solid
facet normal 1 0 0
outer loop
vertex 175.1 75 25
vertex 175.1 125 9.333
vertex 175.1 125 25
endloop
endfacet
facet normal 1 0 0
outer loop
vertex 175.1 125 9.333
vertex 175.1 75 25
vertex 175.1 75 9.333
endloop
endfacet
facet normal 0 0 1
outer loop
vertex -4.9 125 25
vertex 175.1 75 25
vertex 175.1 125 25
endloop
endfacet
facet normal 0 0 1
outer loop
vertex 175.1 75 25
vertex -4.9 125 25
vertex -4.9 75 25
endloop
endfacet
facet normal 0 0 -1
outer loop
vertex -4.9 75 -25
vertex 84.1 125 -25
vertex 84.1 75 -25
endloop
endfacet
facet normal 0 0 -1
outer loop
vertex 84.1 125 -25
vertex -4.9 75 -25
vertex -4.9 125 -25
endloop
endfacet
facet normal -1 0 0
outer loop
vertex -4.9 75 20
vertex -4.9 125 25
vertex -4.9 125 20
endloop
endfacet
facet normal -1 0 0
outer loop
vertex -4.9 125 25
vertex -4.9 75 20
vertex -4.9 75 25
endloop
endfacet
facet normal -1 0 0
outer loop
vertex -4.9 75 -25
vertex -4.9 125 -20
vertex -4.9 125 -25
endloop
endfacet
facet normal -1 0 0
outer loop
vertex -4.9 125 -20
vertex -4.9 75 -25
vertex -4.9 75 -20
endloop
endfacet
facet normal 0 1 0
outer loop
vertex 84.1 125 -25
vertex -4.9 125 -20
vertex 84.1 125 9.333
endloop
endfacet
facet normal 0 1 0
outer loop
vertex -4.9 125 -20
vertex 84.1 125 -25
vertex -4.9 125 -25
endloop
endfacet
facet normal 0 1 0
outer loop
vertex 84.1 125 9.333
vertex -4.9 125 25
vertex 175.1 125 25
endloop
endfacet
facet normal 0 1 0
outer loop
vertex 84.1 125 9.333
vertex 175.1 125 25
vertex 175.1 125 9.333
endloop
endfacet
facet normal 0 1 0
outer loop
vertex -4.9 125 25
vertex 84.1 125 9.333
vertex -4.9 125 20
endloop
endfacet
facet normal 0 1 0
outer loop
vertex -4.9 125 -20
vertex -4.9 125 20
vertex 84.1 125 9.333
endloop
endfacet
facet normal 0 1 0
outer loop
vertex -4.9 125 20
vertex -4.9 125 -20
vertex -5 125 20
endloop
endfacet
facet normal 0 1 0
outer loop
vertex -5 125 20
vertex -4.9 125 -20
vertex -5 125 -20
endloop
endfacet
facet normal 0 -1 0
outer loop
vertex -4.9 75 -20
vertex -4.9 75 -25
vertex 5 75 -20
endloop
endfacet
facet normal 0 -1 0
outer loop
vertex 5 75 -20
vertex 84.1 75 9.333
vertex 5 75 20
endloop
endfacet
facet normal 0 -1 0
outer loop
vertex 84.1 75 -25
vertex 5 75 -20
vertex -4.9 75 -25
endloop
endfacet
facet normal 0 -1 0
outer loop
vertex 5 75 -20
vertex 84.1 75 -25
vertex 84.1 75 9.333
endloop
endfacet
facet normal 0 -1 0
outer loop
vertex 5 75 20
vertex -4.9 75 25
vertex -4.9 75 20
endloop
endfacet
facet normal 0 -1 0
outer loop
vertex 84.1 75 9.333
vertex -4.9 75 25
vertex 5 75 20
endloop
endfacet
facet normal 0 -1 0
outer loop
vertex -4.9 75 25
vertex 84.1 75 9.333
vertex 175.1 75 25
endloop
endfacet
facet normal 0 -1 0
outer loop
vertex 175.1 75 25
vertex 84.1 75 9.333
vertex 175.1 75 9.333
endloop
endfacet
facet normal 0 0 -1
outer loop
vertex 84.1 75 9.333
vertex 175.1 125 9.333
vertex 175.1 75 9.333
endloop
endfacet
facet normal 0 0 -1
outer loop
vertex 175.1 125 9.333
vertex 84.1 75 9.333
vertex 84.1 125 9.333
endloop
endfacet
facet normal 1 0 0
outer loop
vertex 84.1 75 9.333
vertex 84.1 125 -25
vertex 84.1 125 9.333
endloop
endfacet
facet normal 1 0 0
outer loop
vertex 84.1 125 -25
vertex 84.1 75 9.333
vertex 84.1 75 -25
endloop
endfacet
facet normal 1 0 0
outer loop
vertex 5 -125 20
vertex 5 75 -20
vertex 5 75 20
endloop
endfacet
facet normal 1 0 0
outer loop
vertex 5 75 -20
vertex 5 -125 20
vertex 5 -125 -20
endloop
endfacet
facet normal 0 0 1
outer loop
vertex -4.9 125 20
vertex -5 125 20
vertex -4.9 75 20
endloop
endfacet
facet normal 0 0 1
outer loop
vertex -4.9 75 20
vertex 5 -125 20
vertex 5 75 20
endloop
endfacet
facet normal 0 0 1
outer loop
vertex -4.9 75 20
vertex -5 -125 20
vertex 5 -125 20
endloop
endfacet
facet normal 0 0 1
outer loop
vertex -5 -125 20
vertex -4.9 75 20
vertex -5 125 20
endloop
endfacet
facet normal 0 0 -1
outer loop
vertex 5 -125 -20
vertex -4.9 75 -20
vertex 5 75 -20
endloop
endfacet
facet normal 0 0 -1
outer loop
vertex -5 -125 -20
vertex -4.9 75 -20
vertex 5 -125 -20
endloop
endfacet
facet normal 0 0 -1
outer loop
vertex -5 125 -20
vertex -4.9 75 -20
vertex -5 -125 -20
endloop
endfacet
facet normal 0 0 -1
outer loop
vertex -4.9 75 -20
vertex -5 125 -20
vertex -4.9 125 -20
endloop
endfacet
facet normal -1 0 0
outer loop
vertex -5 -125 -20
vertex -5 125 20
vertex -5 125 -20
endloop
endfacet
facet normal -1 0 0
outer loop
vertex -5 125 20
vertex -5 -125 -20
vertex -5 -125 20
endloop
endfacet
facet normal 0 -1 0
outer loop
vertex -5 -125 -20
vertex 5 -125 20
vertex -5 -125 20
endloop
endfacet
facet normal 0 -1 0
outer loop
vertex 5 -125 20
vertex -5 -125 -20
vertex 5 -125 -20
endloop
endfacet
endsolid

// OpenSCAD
module right_arm_new(){
    arm_x = 10;
    arm_y = 250;
    arm_z = 40;
    
    cube([arm_x,arm_y,arm_z],center=true);  
   
    x_base = 180;
    y_base = 50;
    z_base = 50; 
    
    translate([x_base/2-arm_x/2+0.1,arm_y/2-y_base/2,0]){
    difference(){
        cube([x_base,y_base,z_base],center=true);
        translate([x_base/2,0,-z_base/3])
            cube([x_base+2,y_base+2,z_base+2],center=true);
    }  
    ant_z = 350;
    ant_y = 240;
    ant_x = 10;
    
    dis_to_ground = 210;
    dis_to_robot = 300;

//    translate([0,0,-ant_z/2+20]){
//        cube([ant_x,ant_y,ant_z],center = true); 
////        translate([0,0,-ant_z/2-dis_to_ground/2])
////        cube([50,10,dis_to_ground],center=true);
////        translate([0,-ant_y/2-dis_to_robot/2,0])
////        cube([50,dis_to_robot,10],center=true);
//    }
    }
}

right_arm_new();
